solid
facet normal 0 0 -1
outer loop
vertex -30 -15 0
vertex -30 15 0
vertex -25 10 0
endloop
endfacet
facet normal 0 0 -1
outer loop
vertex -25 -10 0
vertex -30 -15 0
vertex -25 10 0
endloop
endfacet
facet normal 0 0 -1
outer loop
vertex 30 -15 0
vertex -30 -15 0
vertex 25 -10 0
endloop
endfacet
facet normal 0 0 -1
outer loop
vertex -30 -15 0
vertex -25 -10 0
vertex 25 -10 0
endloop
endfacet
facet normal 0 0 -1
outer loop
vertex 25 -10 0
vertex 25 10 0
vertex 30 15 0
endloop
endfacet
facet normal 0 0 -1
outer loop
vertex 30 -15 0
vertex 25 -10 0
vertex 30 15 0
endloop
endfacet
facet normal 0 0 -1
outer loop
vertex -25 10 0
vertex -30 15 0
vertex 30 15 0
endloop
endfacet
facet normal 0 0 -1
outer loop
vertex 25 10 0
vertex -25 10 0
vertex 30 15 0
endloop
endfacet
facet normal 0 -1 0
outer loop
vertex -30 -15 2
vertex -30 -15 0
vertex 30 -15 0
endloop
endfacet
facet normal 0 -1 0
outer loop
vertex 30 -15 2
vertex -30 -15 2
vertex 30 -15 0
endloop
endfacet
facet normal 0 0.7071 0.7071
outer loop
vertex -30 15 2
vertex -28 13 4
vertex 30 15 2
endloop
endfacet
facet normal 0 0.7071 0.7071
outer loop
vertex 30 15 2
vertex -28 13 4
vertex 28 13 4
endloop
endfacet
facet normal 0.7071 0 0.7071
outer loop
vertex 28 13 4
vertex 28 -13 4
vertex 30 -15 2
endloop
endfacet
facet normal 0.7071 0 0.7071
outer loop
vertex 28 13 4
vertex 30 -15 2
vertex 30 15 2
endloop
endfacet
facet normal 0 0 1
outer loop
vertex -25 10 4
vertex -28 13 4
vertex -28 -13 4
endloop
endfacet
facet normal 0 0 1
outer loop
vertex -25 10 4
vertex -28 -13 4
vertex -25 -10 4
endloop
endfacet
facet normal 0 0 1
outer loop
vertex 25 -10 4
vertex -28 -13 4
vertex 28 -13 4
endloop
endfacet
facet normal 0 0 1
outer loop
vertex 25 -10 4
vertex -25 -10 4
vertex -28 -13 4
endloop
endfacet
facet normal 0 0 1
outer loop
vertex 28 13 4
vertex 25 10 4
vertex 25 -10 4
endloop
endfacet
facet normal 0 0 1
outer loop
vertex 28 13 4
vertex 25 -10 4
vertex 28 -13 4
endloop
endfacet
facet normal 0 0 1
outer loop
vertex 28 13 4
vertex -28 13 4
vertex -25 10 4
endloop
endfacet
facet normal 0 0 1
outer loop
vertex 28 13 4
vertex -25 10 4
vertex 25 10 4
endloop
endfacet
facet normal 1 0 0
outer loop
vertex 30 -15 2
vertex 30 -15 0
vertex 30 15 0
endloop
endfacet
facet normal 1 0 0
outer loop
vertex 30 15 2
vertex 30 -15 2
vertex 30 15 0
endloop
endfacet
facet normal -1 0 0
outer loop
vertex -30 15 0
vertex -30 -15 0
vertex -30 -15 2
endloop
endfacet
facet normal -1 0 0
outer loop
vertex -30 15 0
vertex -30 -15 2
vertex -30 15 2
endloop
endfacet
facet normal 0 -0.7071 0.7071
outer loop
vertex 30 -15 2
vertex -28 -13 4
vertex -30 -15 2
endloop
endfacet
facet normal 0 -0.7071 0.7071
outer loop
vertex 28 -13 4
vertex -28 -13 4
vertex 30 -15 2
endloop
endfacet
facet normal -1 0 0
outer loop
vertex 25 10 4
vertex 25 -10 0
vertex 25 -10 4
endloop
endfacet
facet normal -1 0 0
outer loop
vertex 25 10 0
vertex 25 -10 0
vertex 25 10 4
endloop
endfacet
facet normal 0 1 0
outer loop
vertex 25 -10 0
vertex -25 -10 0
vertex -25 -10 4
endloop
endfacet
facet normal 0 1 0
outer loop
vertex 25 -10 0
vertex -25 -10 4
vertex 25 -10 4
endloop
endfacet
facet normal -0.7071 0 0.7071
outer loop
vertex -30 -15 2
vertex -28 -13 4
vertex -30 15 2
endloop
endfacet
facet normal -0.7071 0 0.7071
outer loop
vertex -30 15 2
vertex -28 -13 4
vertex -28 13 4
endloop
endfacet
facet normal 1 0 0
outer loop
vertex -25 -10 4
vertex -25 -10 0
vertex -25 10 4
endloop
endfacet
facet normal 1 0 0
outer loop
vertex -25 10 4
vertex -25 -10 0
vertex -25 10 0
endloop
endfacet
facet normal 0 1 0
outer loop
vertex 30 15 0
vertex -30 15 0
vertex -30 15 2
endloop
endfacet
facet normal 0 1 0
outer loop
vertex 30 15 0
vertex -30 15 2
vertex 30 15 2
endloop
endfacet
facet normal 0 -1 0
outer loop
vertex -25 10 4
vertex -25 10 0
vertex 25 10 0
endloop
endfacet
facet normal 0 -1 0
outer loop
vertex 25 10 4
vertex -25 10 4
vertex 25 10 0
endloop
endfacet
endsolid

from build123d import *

# Parameters (mm, degrees)
SKETCH_W     = 60
SKETCH_H     = 30
SKETCH_W_2   = 50
SKETCH_H_2   = 20
PAD_DEPTH    = 4
CHAMFER_SIZE = 2


with BuildPart() as part:
    # Sketch → Pad (new body)
    with BuildSketch(Plane.XY):
        Rectangle(SKETCH_W, SKETCH_H)
        Rectangle(SKETCH_W_2, SKETCH_H_2, mode=Mode.SUBTRACT)
    extrude(amount=PAD_DEPTH)

    # Chamfer
    chamfer_edges = [part.edges().sort_by_distance(p)[0] for p in [
        (0, -15, 4),
        (30, 0, 4),
        (0, 15, 4),
        (-30, 0, 4),
    ]]
    chamfer(chamfer_edges, length=CHAMFER_SIZE)


solid = part.part
